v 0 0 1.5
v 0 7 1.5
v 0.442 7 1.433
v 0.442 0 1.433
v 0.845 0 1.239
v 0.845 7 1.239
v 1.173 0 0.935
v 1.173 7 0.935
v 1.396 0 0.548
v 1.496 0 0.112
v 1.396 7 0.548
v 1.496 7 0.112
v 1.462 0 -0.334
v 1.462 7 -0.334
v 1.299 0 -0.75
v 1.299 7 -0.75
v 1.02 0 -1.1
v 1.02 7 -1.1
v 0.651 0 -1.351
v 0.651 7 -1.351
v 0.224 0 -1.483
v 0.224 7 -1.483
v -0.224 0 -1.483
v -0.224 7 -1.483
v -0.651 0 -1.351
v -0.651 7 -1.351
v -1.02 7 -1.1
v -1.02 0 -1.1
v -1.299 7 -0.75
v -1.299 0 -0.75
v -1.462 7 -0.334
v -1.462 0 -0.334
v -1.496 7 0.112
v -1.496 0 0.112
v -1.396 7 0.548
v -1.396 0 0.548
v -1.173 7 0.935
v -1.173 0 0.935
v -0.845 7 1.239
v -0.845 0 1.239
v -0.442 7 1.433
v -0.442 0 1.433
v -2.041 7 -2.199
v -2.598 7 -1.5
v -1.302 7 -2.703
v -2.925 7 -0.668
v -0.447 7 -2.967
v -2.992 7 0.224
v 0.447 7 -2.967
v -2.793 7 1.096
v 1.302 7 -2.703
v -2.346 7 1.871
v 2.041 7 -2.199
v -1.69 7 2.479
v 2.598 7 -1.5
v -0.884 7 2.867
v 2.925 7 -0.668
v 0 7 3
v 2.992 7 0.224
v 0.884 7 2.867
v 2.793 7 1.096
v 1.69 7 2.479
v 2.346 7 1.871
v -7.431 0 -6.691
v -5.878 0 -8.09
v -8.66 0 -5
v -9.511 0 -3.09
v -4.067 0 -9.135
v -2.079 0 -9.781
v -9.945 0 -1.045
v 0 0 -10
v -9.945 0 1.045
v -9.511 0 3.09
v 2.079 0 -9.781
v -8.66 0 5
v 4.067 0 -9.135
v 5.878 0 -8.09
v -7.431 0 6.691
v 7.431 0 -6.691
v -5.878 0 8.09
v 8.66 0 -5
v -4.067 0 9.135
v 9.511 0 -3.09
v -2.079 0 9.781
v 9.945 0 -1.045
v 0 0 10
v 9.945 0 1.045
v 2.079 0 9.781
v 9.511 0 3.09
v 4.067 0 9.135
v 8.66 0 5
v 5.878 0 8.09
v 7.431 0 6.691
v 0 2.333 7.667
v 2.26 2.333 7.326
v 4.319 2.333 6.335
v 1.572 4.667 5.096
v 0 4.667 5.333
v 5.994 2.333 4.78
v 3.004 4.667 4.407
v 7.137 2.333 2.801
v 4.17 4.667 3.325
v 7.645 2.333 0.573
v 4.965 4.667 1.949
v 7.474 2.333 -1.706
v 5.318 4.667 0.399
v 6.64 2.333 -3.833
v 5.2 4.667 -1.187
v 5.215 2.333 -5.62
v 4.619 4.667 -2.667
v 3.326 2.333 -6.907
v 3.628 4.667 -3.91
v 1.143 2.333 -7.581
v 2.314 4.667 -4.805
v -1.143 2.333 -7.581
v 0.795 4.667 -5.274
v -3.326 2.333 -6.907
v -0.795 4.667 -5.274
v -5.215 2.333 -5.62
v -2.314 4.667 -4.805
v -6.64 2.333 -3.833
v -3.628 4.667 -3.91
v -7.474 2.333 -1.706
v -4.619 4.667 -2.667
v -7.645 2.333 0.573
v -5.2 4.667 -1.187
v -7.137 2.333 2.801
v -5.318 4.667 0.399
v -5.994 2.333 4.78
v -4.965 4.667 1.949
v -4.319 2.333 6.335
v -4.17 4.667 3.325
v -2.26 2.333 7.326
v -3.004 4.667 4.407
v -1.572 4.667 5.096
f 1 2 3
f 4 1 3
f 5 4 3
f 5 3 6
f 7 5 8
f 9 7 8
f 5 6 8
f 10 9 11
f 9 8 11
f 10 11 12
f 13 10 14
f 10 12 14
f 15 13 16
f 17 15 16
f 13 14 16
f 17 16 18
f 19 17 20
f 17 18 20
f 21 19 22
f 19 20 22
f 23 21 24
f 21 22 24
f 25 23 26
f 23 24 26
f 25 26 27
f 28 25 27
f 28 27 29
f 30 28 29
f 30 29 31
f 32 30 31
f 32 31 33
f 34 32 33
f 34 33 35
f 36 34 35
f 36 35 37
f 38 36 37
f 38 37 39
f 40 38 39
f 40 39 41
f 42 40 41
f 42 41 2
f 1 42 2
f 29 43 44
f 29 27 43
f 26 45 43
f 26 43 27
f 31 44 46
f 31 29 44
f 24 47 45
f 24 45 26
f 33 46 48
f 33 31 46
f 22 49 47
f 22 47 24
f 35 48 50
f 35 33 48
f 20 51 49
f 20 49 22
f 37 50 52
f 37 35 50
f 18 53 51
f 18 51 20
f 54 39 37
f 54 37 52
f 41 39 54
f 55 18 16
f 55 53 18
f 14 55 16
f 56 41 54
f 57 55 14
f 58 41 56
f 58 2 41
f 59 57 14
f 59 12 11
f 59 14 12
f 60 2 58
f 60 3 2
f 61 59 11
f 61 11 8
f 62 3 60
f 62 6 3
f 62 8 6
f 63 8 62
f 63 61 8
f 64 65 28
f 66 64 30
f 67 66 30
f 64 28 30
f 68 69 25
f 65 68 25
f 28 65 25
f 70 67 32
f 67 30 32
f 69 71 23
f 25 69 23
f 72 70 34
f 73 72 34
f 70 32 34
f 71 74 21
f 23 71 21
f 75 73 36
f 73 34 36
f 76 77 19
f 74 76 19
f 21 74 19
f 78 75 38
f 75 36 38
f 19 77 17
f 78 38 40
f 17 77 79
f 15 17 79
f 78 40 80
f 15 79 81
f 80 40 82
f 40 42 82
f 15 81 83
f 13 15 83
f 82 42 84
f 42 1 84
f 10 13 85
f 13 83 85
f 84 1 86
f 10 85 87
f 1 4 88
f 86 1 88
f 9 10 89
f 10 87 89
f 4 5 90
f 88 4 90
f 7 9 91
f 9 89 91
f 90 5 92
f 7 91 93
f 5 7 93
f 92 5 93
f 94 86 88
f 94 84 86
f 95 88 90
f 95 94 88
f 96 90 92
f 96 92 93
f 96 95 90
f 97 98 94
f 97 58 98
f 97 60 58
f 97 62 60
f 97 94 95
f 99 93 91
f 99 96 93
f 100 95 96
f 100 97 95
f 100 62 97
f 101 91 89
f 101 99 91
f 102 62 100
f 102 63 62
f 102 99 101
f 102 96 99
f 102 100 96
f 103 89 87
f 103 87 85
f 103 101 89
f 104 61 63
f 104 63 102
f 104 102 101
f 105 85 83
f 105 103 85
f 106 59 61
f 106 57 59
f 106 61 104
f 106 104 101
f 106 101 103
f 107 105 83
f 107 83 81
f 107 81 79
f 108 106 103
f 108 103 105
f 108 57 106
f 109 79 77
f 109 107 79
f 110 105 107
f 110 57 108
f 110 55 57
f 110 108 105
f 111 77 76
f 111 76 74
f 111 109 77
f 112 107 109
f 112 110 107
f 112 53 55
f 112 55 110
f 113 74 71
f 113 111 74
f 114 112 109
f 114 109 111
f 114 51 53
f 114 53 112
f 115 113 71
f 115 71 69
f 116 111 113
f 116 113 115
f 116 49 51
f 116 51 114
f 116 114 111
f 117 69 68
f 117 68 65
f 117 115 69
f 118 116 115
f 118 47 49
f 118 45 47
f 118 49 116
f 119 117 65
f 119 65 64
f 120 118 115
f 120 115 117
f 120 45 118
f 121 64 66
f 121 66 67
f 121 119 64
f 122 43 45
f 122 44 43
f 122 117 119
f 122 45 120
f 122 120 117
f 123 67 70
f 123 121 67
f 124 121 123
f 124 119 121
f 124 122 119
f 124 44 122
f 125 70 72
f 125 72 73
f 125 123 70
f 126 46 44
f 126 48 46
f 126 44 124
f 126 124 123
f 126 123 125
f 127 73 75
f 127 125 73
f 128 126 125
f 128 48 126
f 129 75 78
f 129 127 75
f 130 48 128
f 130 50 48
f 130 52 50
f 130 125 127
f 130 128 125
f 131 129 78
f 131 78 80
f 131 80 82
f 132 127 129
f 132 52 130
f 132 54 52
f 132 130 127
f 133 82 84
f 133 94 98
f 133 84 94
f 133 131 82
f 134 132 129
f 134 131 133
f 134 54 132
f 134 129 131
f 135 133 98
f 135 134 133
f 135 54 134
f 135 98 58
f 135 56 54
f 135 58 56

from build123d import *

# Parameters (mm, degrees)
SKETCH1_R           = 10
BOSS_EXTRUDE1_DEPTH = 7
CHAMFER1_SIZE       = 7
SKETCH2_R           = 1.5
CUT_EXTRUDE1_DEPTH  = 16.779733838


with BuildPart() as part:
    # Sketch1 → Boss-Extrude1 (new body)
    with BuildSketch(Plane(origin=(0, 0, 0), x_dir=(1, 0, 0), z_dir=(0, 1, 0))):
        with Locations(Location((0, 0, 0), (0, 0, 270))):
            Circle(SKETCH1_R)
    extrude(amount=BOSS_EXTRUDE1_DEPTH)

    # Chamfer1
    chamfer1_edges = [part.edges().sort_by_distance(p)[0] for p in [
        (0, 7, -10),
    ]]
    chamfer(chamfer1_edges, length=CHAMFER1_SIZE - 0.0001)  # a hair under: the kernel refuses the full size

    # Sketch2 → Cut-Extrude1 (cut, through all)
    with BuildSketch(Plane(origin=(0, 7, 0), x_dir=(1, 0, 0), z_dir=(0, 1, 0))):
        with Locations(Location((0, 0, 0), (0, 0, 270))):
            Circle(SKETCH2_R)
    extrude(amount=-CUT_EXTRUDE1_DEPTH, mode=Mode.SUBTRACT)


solid = part.part
